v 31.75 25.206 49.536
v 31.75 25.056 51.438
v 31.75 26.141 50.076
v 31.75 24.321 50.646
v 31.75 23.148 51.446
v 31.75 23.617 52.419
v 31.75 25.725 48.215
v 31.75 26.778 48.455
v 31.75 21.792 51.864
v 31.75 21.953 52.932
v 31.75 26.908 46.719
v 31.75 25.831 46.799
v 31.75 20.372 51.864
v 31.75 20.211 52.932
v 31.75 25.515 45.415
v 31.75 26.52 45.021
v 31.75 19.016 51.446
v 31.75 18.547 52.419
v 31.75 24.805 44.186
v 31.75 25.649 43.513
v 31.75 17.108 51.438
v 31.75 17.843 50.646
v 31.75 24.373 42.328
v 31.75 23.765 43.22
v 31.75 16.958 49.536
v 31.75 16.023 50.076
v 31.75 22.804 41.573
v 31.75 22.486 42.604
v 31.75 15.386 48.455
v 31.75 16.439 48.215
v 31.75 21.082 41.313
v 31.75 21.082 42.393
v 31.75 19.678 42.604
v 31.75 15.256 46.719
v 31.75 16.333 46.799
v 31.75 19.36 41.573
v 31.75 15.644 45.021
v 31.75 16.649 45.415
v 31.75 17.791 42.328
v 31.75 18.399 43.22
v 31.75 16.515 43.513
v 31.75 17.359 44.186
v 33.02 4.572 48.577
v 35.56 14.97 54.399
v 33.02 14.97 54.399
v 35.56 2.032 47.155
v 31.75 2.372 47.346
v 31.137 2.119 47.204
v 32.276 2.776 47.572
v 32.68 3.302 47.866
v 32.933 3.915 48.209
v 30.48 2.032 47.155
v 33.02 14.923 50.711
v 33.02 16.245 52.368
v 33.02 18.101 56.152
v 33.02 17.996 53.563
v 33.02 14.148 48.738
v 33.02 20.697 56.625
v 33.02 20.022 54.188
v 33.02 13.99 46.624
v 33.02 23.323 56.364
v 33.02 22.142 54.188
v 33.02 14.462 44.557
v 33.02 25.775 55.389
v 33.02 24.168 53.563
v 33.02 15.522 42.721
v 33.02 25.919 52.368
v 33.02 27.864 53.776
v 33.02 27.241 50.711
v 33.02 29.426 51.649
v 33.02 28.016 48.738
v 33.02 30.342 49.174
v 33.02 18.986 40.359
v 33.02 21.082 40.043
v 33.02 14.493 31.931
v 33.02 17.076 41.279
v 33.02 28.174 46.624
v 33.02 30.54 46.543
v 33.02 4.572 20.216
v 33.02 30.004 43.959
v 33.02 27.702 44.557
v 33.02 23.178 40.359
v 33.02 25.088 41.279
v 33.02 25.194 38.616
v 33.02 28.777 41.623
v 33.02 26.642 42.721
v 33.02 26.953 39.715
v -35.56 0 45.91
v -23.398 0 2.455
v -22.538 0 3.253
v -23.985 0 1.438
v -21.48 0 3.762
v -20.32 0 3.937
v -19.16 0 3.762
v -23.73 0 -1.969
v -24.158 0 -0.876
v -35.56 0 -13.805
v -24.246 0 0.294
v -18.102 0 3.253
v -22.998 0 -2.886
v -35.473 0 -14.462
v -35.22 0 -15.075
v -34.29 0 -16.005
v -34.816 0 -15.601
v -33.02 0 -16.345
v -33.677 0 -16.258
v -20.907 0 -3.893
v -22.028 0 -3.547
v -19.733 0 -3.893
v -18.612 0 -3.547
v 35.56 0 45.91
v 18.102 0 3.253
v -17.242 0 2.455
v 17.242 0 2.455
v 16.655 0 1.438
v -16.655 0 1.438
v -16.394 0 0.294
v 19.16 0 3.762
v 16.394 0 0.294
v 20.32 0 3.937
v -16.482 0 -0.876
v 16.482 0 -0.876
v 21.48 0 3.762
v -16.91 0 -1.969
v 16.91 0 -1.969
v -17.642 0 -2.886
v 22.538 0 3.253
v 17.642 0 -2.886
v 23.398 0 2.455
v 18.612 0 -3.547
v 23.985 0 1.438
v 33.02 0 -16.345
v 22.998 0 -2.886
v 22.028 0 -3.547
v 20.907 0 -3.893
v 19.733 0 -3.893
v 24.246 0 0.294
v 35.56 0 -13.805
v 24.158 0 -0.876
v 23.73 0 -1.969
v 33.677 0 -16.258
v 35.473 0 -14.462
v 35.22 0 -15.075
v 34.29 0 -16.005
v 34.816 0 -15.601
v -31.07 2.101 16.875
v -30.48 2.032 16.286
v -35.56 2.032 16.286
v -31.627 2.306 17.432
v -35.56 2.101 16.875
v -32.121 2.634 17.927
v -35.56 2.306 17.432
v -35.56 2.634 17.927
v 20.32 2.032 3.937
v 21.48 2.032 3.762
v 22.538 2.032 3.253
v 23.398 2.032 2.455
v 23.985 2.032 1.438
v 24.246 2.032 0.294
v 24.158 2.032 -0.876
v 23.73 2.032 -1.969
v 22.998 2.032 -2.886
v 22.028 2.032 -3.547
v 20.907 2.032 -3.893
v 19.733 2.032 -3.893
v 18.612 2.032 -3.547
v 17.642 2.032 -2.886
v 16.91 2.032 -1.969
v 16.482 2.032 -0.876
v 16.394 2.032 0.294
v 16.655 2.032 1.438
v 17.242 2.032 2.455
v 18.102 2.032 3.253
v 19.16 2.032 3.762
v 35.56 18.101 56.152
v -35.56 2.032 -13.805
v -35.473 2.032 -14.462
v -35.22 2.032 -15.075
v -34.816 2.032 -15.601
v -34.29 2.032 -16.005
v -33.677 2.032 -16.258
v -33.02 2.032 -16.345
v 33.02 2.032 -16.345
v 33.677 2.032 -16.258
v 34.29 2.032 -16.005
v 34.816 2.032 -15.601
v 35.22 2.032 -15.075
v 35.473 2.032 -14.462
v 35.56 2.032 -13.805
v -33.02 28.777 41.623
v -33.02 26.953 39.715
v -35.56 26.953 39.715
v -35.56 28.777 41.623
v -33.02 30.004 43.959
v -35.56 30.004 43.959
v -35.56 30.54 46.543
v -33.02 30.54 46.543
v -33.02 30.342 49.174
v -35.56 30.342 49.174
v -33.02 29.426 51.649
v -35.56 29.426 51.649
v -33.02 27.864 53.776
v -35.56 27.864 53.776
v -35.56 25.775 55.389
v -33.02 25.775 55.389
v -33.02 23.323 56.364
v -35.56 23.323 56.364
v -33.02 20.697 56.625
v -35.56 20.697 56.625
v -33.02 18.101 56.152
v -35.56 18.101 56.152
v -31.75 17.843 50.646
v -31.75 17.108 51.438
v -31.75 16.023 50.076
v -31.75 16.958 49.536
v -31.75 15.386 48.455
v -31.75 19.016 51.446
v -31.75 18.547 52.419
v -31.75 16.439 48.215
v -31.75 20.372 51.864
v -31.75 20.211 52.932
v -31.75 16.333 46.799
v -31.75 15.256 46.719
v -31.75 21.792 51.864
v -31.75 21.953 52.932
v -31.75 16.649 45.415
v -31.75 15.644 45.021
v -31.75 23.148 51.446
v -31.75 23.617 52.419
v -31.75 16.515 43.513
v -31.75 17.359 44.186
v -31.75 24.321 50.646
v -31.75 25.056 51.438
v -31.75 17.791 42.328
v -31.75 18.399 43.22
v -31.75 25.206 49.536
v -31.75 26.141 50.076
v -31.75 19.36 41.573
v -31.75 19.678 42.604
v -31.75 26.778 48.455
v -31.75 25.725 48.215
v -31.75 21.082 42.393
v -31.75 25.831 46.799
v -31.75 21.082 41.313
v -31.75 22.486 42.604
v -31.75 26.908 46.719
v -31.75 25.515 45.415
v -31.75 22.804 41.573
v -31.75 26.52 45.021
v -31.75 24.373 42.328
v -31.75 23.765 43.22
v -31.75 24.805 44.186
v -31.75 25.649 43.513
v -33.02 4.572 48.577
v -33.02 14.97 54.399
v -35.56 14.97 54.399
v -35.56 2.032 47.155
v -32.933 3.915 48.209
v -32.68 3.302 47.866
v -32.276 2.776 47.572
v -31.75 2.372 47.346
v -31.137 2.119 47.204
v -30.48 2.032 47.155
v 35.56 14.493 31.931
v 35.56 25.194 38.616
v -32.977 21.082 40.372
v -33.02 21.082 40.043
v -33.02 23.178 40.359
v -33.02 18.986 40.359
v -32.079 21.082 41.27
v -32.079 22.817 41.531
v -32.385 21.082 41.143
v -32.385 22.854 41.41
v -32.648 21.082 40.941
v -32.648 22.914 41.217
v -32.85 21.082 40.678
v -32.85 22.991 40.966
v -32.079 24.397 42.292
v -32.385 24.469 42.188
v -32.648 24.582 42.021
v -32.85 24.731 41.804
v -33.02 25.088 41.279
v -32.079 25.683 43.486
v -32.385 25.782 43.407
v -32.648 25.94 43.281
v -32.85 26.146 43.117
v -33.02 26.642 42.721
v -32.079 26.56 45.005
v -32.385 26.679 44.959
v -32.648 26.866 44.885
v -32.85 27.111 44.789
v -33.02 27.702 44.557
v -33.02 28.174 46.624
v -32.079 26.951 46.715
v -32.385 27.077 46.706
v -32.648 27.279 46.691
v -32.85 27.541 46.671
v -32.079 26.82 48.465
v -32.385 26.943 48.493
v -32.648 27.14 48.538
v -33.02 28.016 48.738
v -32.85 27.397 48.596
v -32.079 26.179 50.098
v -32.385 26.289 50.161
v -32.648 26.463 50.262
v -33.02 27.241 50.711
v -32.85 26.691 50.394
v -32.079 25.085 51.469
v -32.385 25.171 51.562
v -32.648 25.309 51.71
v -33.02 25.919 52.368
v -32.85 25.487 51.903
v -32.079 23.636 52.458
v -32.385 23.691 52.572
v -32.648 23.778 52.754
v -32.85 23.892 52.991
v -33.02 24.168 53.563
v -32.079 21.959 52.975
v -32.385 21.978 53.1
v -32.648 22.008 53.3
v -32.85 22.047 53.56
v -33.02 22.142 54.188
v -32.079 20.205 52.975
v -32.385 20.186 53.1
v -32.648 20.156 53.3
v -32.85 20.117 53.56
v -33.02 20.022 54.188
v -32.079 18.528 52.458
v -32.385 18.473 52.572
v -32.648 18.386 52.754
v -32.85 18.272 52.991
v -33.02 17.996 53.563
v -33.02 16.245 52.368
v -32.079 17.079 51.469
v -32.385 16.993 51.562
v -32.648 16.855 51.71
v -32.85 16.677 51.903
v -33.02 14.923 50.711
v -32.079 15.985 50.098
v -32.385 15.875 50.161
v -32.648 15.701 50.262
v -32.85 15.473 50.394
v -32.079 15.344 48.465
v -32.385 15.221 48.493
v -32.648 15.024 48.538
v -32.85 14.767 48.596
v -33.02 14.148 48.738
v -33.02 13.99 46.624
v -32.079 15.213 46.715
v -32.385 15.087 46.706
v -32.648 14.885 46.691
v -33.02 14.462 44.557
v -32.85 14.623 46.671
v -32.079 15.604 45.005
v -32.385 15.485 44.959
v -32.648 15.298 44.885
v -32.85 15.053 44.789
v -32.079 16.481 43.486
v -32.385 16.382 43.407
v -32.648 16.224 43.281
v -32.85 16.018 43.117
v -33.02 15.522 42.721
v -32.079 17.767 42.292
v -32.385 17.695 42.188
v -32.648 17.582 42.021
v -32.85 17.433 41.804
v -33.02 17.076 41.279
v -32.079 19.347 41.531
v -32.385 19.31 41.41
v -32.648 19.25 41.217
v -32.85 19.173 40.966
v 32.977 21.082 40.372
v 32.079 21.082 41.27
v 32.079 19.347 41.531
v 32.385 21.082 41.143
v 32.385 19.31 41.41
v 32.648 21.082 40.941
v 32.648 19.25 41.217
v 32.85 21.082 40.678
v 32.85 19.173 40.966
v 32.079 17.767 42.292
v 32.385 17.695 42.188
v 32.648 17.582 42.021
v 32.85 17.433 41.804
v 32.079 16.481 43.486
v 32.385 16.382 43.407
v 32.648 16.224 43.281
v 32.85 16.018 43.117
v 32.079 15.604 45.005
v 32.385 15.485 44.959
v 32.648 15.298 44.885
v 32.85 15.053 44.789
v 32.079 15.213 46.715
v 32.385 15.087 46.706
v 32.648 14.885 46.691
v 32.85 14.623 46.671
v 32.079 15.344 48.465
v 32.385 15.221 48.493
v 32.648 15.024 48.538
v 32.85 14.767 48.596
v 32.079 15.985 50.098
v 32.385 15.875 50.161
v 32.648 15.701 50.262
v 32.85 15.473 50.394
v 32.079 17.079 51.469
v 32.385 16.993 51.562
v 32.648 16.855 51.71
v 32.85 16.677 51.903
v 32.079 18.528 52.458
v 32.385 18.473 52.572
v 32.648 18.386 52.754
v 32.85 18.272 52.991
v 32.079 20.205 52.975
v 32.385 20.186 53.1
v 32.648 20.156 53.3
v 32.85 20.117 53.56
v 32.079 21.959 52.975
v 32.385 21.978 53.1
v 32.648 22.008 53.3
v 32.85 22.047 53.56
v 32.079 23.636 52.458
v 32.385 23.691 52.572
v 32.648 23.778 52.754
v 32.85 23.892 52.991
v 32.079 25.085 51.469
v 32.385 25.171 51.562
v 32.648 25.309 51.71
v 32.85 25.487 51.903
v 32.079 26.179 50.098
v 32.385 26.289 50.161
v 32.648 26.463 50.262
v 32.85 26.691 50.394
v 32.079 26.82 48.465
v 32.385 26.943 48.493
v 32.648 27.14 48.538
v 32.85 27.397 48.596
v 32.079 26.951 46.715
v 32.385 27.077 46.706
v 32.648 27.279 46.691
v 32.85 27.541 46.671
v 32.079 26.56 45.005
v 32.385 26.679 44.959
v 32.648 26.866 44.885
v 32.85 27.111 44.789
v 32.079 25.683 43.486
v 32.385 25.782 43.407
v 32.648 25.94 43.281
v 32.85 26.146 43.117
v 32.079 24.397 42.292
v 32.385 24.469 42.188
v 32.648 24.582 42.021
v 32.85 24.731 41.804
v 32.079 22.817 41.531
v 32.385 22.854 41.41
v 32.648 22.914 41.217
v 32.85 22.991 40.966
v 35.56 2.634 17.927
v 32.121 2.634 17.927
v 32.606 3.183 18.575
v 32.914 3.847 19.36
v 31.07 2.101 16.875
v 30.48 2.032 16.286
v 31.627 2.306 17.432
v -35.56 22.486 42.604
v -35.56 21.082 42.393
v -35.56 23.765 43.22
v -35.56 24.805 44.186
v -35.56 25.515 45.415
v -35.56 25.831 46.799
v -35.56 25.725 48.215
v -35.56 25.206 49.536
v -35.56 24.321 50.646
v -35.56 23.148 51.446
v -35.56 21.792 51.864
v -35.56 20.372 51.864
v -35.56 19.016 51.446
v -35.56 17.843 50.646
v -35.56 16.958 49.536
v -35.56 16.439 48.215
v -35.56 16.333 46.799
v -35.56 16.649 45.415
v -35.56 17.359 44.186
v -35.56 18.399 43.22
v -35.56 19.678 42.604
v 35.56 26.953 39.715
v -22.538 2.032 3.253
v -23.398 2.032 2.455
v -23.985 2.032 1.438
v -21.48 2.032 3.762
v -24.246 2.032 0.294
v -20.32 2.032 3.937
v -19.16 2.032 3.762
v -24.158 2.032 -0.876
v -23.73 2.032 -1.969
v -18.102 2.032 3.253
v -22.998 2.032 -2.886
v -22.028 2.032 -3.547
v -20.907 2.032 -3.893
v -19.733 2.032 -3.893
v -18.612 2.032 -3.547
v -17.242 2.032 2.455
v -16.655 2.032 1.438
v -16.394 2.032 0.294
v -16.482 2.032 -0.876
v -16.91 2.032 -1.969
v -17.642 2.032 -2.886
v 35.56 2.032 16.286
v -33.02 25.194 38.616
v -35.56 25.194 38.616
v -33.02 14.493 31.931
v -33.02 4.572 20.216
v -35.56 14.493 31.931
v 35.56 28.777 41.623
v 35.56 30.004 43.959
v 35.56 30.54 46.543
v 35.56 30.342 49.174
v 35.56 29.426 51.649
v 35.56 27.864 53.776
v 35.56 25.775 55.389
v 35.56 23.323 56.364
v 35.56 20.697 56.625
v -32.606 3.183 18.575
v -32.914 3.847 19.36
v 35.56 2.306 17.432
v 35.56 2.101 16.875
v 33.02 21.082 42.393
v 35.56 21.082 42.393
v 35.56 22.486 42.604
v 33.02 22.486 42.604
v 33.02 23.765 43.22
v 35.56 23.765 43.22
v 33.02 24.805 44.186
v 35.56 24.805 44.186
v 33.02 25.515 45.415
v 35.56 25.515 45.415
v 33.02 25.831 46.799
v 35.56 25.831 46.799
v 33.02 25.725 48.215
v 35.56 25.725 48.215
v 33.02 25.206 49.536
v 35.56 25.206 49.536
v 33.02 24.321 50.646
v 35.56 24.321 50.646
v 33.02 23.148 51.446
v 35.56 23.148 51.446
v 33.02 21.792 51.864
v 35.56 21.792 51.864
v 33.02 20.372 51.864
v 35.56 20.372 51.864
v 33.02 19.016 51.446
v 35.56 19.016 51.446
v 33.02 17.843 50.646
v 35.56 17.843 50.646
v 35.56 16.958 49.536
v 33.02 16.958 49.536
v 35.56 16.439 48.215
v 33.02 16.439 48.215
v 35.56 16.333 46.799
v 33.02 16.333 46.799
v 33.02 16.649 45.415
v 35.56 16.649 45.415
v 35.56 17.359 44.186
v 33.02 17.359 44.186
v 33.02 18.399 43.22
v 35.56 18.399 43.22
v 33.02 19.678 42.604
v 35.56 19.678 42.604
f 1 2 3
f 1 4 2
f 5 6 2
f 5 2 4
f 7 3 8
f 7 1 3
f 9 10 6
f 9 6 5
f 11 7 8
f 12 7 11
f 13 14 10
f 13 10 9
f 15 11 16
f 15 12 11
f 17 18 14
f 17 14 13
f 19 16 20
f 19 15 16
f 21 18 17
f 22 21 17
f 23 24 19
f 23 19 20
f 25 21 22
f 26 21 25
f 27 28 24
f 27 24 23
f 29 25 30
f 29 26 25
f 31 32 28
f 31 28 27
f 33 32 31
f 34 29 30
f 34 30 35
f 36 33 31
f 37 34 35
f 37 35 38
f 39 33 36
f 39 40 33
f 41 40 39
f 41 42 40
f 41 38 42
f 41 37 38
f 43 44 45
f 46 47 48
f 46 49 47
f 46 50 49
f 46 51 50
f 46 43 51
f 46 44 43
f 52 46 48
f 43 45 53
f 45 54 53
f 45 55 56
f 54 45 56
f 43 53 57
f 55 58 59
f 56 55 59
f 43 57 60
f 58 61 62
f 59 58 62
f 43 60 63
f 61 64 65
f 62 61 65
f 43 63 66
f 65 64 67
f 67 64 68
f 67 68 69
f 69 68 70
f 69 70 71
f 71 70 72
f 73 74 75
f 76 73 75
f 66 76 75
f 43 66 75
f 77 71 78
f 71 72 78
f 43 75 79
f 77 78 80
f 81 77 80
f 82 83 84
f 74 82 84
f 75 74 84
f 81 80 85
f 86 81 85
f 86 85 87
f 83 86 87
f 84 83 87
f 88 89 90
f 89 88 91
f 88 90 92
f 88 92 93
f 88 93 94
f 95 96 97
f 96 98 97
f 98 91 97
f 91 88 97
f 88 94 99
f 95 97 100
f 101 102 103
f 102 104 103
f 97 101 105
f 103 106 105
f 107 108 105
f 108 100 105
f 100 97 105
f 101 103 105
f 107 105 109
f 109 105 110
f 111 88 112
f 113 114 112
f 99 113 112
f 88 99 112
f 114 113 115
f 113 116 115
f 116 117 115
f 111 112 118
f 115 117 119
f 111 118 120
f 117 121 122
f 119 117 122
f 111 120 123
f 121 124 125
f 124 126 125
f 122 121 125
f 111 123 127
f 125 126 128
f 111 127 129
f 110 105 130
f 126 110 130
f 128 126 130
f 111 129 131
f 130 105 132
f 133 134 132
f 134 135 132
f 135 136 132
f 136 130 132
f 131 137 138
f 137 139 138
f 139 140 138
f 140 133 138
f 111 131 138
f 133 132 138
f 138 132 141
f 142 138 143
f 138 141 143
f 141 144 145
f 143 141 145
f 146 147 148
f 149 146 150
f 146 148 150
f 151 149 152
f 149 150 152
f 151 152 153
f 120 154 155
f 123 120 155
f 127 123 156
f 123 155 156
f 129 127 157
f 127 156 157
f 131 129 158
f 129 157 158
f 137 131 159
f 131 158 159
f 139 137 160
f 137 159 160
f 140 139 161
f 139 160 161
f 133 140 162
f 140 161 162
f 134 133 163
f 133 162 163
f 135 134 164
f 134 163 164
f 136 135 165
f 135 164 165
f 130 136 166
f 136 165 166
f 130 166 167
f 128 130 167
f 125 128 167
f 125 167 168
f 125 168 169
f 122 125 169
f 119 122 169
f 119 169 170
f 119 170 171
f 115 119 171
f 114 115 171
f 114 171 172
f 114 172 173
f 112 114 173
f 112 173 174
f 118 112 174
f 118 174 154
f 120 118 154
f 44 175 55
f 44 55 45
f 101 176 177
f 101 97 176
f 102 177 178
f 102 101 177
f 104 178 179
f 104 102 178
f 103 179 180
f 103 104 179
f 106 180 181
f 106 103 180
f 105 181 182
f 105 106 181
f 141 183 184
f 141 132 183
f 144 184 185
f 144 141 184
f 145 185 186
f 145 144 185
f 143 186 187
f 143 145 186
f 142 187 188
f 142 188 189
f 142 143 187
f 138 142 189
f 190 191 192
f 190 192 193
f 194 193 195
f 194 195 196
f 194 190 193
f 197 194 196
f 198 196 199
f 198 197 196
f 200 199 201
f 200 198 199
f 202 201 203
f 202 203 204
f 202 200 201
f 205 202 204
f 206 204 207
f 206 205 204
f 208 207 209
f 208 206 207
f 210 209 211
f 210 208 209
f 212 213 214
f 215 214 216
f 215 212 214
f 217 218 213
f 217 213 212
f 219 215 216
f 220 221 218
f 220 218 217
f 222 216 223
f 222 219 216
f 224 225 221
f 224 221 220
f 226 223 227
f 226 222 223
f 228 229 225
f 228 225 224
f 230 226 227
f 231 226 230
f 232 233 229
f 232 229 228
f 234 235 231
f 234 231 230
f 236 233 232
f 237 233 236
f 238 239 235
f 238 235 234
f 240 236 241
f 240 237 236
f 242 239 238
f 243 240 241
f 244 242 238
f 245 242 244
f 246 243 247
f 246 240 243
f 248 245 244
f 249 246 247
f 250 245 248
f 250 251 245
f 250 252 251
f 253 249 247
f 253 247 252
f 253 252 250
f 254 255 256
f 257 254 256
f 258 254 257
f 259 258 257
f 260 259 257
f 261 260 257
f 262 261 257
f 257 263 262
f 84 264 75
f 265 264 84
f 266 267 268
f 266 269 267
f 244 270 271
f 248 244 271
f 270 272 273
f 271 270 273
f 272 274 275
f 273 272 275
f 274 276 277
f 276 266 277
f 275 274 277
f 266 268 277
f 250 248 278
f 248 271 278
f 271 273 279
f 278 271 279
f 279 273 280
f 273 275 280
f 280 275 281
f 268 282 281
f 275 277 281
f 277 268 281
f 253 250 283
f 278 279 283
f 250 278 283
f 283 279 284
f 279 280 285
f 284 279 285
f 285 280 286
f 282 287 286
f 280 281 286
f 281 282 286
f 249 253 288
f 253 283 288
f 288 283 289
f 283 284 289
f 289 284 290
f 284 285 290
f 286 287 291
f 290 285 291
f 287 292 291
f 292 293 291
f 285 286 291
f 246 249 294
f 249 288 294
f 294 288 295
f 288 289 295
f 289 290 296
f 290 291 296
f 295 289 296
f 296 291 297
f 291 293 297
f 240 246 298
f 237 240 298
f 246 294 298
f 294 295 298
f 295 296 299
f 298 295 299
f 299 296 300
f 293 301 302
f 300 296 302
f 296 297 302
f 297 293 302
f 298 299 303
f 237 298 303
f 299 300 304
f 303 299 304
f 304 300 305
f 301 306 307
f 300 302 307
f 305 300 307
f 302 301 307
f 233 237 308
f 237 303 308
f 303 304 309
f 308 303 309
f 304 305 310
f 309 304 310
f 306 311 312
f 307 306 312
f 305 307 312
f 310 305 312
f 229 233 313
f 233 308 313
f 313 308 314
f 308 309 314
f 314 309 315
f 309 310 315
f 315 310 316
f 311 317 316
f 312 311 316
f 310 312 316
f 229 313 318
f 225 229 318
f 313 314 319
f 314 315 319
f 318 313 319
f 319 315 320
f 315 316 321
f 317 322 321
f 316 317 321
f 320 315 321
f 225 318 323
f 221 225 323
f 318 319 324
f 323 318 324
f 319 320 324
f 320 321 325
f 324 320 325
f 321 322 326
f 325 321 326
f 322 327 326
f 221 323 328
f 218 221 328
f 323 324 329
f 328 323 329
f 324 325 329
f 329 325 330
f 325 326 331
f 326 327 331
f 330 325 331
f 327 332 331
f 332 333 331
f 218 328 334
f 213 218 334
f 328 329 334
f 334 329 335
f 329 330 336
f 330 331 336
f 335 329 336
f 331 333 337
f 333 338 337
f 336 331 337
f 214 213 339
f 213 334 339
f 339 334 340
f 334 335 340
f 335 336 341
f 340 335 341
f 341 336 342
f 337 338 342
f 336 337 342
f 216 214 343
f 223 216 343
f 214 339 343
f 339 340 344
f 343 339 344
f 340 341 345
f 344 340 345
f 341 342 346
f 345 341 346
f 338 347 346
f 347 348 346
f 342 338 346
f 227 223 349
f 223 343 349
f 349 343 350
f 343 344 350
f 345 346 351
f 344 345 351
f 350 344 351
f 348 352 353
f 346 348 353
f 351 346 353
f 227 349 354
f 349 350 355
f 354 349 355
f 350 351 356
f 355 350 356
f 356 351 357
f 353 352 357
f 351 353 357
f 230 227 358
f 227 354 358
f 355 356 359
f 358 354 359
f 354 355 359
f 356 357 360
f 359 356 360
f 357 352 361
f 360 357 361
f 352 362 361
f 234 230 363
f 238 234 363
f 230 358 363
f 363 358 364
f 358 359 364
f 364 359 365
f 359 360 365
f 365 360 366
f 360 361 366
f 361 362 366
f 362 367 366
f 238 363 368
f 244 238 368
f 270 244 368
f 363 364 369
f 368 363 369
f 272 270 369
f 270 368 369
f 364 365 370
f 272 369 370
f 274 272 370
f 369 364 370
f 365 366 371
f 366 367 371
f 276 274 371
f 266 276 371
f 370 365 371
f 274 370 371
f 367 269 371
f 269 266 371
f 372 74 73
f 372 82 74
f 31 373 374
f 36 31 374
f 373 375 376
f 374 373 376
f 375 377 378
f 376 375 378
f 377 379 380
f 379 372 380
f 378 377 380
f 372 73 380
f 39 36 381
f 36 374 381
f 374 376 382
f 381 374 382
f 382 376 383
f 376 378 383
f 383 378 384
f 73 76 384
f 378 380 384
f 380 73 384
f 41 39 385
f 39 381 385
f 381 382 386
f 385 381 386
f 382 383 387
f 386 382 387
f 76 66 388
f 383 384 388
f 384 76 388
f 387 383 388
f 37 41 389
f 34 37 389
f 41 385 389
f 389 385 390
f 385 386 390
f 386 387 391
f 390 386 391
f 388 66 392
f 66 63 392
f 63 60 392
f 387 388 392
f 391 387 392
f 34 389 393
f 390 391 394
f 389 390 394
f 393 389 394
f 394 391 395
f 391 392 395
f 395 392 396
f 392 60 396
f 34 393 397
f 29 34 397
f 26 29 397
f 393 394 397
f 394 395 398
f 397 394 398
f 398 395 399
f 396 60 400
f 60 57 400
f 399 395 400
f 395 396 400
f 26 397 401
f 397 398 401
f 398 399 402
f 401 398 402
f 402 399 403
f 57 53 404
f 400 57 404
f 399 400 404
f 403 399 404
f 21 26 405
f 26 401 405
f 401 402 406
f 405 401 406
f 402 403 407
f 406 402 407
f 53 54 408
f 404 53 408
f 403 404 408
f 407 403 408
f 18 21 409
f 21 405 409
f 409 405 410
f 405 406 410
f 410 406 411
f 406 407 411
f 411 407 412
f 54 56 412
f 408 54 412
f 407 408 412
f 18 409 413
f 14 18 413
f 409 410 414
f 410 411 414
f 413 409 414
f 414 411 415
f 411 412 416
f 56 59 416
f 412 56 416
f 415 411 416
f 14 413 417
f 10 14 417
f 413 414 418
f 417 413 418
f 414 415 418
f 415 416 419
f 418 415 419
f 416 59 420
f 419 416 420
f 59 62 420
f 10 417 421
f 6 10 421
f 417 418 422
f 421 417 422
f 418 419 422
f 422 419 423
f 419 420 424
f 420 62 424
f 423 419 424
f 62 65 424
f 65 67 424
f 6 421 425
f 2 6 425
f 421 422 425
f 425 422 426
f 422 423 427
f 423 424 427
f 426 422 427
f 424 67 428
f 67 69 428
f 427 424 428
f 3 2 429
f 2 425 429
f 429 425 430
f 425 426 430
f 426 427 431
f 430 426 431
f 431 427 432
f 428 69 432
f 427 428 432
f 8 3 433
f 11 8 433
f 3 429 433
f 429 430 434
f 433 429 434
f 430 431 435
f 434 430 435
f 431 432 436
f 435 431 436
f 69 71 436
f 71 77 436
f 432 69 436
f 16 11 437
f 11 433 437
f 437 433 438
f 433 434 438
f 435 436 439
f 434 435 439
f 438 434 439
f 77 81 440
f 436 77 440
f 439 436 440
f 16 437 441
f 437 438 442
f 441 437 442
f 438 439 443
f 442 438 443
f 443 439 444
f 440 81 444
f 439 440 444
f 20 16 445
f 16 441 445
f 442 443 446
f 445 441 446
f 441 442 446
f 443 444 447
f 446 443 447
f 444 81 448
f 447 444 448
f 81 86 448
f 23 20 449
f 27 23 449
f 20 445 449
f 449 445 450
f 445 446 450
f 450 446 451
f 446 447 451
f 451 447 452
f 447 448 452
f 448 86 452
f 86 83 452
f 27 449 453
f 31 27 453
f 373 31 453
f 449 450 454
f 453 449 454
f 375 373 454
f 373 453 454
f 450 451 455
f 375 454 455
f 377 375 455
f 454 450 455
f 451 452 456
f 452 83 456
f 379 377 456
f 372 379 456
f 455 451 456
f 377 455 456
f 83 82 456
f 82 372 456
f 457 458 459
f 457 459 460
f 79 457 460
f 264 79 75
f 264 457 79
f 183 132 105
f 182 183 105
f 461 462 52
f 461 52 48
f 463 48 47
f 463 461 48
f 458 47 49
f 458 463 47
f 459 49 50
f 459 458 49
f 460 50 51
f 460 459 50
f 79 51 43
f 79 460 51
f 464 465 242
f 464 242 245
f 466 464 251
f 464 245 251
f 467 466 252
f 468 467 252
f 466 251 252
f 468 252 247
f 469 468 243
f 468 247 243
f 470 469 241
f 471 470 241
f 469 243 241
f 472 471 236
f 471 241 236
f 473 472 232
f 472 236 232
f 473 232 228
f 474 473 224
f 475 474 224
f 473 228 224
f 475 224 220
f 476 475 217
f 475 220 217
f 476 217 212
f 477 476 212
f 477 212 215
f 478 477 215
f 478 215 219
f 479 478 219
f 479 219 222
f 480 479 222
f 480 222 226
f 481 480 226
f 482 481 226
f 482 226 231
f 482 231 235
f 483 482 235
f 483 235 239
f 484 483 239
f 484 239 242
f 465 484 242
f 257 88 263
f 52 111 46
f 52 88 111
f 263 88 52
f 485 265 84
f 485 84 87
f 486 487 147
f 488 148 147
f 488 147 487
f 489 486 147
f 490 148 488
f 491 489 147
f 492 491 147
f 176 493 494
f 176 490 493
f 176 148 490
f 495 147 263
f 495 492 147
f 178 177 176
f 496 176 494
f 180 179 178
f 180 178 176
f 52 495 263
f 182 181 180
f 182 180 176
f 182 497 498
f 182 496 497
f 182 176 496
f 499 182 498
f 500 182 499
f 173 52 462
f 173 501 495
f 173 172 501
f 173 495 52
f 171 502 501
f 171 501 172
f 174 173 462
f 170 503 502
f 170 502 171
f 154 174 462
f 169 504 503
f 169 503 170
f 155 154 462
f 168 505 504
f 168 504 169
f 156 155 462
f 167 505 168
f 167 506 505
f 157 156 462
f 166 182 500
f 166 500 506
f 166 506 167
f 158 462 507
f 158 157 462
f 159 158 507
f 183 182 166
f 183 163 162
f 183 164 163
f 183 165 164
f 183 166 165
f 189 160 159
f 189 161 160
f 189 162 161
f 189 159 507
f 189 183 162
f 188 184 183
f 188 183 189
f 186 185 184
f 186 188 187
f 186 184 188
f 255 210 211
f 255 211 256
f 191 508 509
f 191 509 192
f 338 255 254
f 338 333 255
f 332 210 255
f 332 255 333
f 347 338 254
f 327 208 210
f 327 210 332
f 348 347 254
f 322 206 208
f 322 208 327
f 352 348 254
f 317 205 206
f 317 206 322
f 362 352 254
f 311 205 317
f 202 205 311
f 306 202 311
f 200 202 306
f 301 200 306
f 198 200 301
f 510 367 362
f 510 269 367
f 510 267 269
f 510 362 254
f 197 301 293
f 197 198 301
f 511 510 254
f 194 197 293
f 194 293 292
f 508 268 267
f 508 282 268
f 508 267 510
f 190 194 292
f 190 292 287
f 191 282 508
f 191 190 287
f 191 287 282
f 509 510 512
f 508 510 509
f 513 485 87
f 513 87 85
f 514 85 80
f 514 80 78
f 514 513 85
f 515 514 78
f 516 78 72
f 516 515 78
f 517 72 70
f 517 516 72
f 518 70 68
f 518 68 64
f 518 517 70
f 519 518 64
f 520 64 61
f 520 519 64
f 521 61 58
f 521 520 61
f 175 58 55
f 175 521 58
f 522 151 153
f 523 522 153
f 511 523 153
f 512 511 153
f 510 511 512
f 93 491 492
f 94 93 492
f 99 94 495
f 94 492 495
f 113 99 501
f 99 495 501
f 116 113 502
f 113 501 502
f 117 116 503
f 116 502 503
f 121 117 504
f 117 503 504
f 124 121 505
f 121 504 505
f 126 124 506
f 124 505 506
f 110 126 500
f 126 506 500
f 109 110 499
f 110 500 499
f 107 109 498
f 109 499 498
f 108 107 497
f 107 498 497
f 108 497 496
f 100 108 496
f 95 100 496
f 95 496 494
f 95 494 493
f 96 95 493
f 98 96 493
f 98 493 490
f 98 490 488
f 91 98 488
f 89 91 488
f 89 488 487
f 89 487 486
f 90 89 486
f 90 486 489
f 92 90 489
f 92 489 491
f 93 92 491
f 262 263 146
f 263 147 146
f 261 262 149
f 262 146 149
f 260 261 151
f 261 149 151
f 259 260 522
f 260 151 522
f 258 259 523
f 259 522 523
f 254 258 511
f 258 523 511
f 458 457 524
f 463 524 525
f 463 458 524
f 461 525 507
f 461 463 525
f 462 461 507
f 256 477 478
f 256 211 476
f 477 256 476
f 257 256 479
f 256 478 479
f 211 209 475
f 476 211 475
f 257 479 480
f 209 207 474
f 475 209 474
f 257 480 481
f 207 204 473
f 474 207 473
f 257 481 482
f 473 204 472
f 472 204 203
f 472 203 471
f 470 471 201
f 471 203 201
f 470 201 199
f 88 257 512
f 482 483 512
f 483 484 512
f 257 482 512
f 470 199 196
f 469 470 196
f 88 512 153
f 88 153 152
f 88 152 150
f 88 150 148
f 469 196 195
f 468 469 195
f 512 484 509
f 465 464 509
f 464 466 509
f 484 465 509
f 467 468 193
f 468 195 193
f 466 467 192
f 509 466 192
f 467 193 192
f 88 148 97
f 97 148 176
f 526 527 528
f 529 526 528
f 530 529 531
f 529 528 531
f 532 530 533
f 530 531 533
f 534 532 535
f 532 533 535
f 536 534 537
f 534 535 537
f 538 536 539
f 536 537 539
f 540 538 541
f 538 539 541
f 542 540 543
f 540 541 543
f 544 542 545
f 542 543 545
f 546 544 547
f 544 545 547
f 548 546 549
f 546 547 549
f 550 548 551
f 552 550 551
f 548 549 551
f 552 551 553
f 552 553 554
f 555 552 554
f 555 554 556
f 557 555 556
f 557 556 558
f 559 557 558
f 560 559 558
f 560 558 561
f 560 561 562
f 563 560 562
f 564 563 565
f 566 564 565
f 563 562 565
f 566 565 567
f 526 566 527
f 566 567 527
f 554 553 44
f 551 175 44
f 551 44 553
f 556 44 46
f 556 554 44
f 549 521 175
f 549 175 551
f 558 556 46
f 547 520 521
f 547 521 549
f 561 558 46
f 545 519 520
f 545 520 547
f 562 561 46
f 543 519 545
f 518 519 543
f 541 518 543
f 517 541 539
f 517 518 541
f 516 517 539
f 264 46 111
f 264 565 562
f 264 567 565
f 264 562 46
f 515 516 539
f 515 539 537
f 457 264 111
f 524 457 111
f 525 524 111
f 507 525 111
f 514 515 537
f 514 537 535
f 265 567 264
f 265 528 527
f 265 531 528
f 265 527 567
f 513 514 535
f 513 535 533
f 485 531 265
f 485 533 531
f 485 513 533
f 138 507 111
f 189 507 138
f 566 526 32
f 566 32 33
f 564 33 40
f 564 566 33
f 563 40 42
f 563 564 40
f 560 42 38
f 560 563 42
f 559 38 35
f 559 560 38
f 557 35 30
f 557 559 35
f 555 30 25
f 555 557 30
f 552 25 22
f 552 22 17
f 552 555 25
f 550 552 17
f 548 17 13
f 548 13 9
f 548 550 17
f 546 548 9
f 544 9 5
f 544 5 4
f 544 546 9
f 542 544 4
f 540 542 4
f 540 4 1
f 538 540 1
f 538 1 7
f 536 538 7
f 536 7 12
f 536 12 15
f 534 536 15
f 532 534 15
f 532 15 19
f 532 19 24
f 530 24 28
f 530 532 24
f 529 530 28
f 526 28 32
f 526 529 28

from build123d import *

# Parameters (mm, degrees)
SKETCH1_R           = 2.7051
BOSS_EXTRUDE1_DEPTH = 2.032
CUT_EXTRUDE1_DEPTH  = 90.633545506
BOSS_EXTRUDE2_START = -2.54
SKETCH2_3_R         = 4.7625
BOSS_EXTRUDE2_DEPTH = 2.54
BOSS_EXTRUDE3_START = -71.12
SKETCH2_4_R         = 4.7625
BOSS_EXTRUDE3_DEPTH = 2.54
SKETCH3_W           = 2.54
SKETCH3_H           = 63.5
CUT_EXTRUDE2_DEPTH  = 74.9775539
FILLET1_R           = 2.54
FILLET2_R           = 2.54
FILLET3_R           = 2.54
BOSS_EXTRUDE4_START = 1.27
SKETCH4_R           = 5.842
SKETCH4_R_2         = 4.7625
BOSS_EXTRUDE4_DEPTH = 1.27
FILLET4_R           = 1.27
SKETCH5_R           = 5.842
SKETCH5_R_2         = 4.7625
BOSS_EXTRUDE5_DEPTH = 1.27
FILLET5_R           = 1.27
SKETCH6_R           = 3.937
CUT_EXTRUDE3_DEPTH  = 2.54


with BuildPart() as part:
    # Sketch1 → Boss-Extrude1 (new body)
    with BuildSketch(Plane(origin=(0, 0, 0), x_dir=(1, 0, 0), z_dir=(0, 1, 0))):
        Polygon((-38.1, -47.1551), (-20.32, -47.1551), (20.32, -47.1551), (38.1, -47.1551), (38.1, 16.3449), (-38.1, 16.3449), align=None)
        with Locations(Location((-20.32, 0, 0), (0, 0, 270))):
            Circle(SKETCH1_R, mode=Mode.SUBTRACT)
        with Locations(Location((20.32, 0, 0), (0, 0, 270))):
            Circle(SKETCH1_R, mode=Mode.SUBTRACT)
    extrude(amount=BOSS_EXTRUDE1_DEPTH)

    # Sketch2 → Cut-Extrude1 (cut, through all)
    with BuildSketch(Plane(origin=(38.1, 0, 0), x_dir=(0, 0, -1), z_dir=(1, 0, 0))):
        Polygon((-47.1551, 2.032), (-47.1551, 0), (-45.909587262, 0), align=None)
    extrude(amount=-CUT_EXTRUDE1_DEPTH, mode=Mode.SUBTRACT)

    # Sketch2<3> → Boss-Extrude2 (add)
    with BuildSketch(Plane(origin=(38.1, 0, 0), x_dir=(0, 0, -1), z_dir=(1, 0, 0)).offset(BOSS_EXTRUDE2_START)):
        with BuildLine():
            Line((-17.216664477, 2.032), (-31.930573826, 14.492637507))
            Line((-31.930573826, 14.492637507), (-38.61588269, 25.193525887))
            Line((-38.61588269, 25.193525887), (-39.715274256, 26.953275014))
            ThreePointArc((-39.715274256, 26.953275014), (-51.649026967, 29.426309307), (-56.151659952, 18.101264116))
            Line((-56.151659952, 18.101264116), (-54.398825604, 14.970427636))
            Line((-54.398825604, 14.970427636), (-47.1551, 2.032))
            Line((-47.1551, 2.032), (-24.145873396, 2.032))
            Line((-24.145873396, 2.032), (-17.216664477, 2.032))
        make_face()
        with Locations((-47.1551, 21.082)):
            Circle(SKETCH2_3_R, mode=Mode.SUBTRACT)
    extrude(amount=-BOSS_EXTRUDE2_DEPTH)

    # Sketch2<4> → Boss-Extrude3 (add)
    with BuildSketch(Plane(origin=(38.1, 0, 0), x_dir=(0, 0, -1), z_dir=(1, 0, 0)).offset(BOSS_EXTRUDE3_START)):
        with BuildLine():
            Line((-17.216664477, 2.032), (-31.930573826, 14.492637507))
            Line((-31.930573826, 14.492637507), (-38.61588269, 25.193525887))
            Line((-38.61588269, 25.193525887), (-39.715274256, 26.953275014))
            ThreePointArc((-39.715274256, 26.953275014), (-51.649026967, 29.426309307), (-56.151659952, 18.101264116))
            Line((-56.151659952, 18.101264116), (-54.398825604, 14.970427636))
            Line((-54.398825604, 14.970427636), (-47.1551, 2.032))
            Line((-47.1551, 2.032), (-24.145873396, 2.032))
            Line((-24.145873396, 2.032), (-17.216664477, 2.032))
        make_face()
        with Locations((-47.1551, 21.082)):
            Circle(SKETCH2_4_R, mode=Mode.SUBTRACT)
    extrude(amount=-BOSS_EXTRUDE3_DEPTH)

    # Sketch3 → Cut-Extrude2 (cut, through all)
    with BuildSketch(Plane(origin=(0, 2.032, 0), x_dir=(1, 0, 0), z_dir=(0, 1, 0))):
        with Locations((-36.83, -15.4051)):
            Rectangle(SKETCH3_W, SKETCH3_H)
        Polygon((35.56, -47.1551), (38.1, -47.1551), (38.1, 16.3449), (36.83, 16.3449), (35.56, 16.3449), align=None)
    extrude(amount=-CUT_EXTRUDE2_DEPTH, mode=Mode.SUBTRACT)

    # Fillet1
    fillet1_edges = [part.edges().sort_by_distance(p)[0] for p in [
        (34.29, 2.032, 17.216664477),
        (33.02, 2.032, 32.185882239),
        (-33.02, 2.032, 32.185882239),
        (-34.29, 2.032, 17.216664477),
    ]]
    fillet(fillet1_edges, radius=FILLET1_R)

    # Fillet2
    fillet2_edges = [part.edges().sort_by_distance(p)[0] for p in [
        (-35.56, 1.016, -16.3449),
    ]]
    fillet(fillet2_edges, radius=FILLET2_R)

    # Fillet3
    fillet3_edges = [part.edges().sort_by_distance(p)[0] for p in [
        (35.56, 1.016, -16.3449),
    ]]
    fillet(fillet3_edges, radius=FILLET3_R)

    # Sketch4 → Boss-Extrude4 (add)
    with BuildSketch(Plane(origin=(-33.02, 0, 0), x_dir=(0, 0, -1), z_dir=(1, 0, 0)).offset(BOSS_EXTRUDE4_START)):
        with Locations((-47.1551, 21.082)):
            Circle(SKETCH4_R)
        with Locations((-47.1551, 21.082)):
            Circle(SKETCH4_R_2, mode=Mode.SUBTRACT)
    extrude(amount=-BOSS_EXTRUDE4_DEPTH)

    # Fillet4
    fillet4_edges = [part.edges().sort_by_distance(p)[0] for p in [
        (-33.02, 21.082, 52.9971),
    ]]
    fillet(fillet4_edges, radius=FILLET4_R - 0.0001)  # a hair under: the kernel refuses the full size

    # Sketch5 → Boss-Extrude5 (add)
    with BuildSketch(Plane.ZY.offset(-33.02)):
        with Locations(Location((47.1551, 21.082, 0), (0, 0, 180))):
            Circle(SKETCH5_R)
        with Locations(Location((47.1551, 21.082, 0), (0, 0, 180))):
            Circle(SKETCH5_R_2, mode=Mode.SUBTRACT)
    extrude(amount=BOSS_EXTRUDE5_DEPTH)

    # Fillet5
    fillet5_edges = [part.edges().sort_by_distance(p)[0] for p in [
        (33.02, 21.082, 52.9971),
    ]]
    fillet(fillet5_edges, radius=FILLET5_R - 0.0001)  # a hair under: the kernel refuses the full size

    # Sketch6 → Cut-Extrude3 (cut)
    with BuildSketch(Plane(origin=(0, 2.032, 0), x_dir=(1, 0, 0), z_dir=(0, 1, 0))):
        with Locations(Location((-20.32, 0, 0), (0, 0, 270))):
            Circle(SKETCH6_R)
        with Locations(Location((20.32, 0, 0), (0, 0, 270))):
            Circle(SKETCH6_R)
    extrude(amount=-CUT_EXTRUDE3_DEPTH, mode=Mode.SUBTRACT)


solid = part.part
